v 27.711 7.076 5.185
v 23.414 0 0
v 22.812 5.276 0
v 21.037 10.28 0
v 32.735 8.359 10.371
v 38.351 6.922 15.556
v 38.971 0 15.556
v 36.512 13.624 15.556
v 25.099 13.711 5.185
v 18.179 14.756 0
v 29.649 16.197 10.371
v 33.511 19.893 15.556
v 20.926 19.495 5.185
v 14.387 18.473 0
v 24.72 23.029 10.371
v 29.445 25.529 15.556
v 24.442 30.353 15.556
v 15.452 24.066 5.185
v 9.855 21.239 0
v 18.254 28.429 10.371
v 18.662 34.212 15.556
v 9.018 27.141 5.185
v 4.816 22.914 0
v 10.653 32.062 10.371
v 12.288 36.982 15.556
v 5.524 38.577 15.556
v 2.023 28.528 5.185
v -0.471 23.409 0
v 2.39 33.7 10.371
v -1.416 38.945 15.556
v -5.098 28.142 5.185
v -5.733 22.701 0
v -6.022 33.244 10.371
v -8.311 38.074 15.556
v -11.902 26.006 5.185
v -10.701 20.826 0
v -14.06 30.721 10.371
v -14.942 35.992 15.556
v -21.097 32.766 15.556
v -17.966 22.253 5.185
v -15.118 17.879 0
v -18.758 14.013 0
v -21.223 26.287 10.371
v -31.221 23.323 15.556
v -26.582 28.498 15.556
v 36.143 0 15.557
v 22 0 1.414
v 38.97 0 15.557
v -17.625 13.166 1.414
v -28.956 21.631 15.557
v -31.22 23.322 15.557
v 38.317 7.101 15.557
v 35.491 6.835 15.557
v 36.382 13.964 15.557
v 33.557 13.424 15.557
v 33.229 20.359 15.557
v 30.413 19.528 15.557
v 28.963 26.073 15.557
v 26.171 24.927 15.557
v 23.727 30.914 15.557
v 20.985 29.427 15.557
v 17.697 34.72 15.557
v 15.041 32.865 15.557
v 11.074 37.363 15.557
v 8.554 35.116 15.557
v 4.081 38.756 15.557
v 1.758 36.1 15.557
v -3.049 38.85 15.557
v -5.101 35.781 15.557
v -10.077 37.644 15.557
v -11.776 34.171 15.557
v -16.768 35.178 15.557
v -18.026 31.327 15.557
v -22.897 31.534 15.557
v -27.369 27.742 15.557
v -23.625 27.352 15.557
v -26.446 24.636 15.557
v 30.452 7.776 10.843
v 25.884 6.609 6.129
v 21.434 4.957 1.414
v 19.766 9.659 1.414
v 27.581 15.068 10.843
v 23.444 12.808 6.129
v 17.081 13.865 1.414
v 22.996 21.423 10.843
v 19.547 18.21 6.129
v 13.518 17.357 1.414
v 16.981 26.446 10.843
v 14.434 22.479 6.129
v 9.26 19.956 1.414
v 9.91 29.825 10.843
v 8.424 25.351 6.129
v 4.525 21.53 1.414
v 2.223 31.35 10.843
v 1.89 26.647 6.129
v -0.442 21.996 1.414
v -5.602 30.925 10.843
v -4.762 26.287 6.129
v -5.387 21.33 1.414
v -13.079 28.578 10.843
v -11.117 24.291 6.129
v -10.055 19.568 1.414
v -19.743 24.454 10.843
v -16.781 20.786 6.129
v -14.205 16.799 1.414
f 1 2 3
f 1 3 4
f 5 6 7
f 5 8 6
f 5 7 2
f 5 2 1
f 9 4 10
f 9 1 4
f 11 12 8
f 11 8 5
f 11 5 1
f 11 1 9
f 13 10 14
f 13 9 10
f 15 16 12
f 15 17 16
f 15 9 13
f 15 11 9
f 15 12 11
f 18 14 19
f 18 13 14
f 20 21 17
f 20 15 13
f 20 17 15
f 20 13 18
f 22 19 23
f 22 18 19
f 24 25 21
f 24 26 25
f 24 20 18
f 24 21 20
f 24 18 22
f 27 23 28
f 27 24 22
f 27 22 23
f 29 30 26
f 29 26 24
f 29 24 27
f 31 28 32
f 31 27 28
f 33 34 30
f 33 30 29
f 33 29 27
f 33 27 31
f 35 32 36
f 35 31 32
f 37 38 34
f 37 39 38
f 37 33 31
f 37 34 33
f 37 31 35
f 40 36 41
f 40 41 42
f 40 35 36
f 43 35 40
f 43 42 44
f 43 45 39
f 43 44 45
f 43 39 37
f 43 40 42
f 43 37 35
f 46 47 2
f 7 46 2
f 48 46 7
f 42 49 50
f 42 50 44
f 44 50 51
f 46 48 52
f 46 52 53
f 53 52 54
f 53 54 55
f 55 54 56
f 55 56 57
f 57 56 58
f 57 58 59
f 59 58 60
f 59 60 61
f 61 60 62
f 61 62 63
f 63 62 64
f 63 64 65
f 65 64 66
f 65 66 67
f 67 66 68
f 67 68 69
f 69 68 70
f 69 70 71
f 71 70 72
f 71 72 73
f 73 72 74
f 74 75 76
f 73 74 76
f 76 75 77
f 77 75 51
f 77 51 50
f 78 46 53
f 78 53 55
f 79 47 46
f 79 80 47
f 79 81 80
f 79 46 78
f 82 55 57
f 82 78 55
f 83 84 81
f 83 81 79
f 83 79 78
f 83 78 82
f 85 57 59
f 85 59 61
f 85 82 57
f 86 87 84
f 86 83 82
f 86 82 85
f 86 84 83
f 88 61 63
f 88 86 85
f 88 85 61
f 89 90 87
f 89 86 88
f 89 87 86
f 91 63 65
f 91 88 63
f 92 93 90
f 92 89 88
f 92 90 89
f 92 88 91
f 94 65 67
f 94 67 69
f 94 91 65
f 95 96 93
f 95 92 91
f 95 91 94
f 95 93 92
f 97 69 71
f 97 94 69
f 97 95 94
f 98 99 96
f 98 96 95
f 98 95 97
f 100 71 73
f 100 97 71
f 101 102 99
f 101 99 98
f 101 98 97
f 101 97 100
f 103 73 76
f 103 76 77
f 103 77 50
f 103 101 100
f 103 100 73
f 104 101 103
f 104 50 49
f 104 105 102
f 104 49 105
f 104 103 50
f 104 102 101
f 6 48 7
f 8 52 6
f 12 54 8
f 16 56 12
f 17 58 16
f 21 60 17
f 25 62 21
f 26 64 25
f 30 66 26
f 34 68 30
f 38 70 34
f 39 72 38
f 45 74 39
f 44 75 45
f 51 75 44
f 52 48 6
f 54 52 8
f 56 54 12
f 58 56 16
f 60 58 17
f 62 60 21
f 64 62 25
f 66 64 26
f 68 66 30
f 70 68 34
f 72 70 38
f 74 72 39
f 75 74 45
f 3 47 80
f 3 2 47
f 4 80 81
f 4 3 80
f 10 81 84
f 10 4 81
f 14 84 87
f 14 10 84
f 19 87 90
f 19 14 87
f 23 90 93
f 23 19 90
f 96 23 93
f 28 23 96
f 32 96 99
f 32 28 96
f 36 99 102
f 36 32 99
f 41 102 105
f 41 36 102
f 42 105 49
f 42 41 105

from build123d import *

# Parameters (mm, degrees)
F1_ANGLE = 143.2394
F2_SIZE2 = 1.999
F2_SIZE  = 1.999


# Not quite as in the source:
# - a fillet or chamfer is up to 0.001 mm smaller than in the source, because OpenCascade refuses the exact size
# - a feature names something its author has since deleted; it is built from what else it names


with BuildPart() as f1:
    # F0 (on Front) → F1 (revolve)
    with BuildSketch(Plane.XZ):
        Polygon((23.4142135624, 0), (38.9705627485, 15.5563491861), (37.5563491861, 16.9705627485), (22, 1.4142135624), align=None)
    revolve(axis=Axis((0, 0, 11), (0, 0, 1)), revolution_arc=F1_ANGLE)

    # F2 (size 2 and 2 in the source; OpenCascade refuses exactly that, so slightly less here)
    f2_edges = [f1.edges().sort_by_distance(p)[0] for p in [
        (11.842372, 35.640393, 16.970563),
    ]]
    chamfer(f2_edges, length=F2_SIZE, length2=F2_SIZE2)


solid = f1.part
